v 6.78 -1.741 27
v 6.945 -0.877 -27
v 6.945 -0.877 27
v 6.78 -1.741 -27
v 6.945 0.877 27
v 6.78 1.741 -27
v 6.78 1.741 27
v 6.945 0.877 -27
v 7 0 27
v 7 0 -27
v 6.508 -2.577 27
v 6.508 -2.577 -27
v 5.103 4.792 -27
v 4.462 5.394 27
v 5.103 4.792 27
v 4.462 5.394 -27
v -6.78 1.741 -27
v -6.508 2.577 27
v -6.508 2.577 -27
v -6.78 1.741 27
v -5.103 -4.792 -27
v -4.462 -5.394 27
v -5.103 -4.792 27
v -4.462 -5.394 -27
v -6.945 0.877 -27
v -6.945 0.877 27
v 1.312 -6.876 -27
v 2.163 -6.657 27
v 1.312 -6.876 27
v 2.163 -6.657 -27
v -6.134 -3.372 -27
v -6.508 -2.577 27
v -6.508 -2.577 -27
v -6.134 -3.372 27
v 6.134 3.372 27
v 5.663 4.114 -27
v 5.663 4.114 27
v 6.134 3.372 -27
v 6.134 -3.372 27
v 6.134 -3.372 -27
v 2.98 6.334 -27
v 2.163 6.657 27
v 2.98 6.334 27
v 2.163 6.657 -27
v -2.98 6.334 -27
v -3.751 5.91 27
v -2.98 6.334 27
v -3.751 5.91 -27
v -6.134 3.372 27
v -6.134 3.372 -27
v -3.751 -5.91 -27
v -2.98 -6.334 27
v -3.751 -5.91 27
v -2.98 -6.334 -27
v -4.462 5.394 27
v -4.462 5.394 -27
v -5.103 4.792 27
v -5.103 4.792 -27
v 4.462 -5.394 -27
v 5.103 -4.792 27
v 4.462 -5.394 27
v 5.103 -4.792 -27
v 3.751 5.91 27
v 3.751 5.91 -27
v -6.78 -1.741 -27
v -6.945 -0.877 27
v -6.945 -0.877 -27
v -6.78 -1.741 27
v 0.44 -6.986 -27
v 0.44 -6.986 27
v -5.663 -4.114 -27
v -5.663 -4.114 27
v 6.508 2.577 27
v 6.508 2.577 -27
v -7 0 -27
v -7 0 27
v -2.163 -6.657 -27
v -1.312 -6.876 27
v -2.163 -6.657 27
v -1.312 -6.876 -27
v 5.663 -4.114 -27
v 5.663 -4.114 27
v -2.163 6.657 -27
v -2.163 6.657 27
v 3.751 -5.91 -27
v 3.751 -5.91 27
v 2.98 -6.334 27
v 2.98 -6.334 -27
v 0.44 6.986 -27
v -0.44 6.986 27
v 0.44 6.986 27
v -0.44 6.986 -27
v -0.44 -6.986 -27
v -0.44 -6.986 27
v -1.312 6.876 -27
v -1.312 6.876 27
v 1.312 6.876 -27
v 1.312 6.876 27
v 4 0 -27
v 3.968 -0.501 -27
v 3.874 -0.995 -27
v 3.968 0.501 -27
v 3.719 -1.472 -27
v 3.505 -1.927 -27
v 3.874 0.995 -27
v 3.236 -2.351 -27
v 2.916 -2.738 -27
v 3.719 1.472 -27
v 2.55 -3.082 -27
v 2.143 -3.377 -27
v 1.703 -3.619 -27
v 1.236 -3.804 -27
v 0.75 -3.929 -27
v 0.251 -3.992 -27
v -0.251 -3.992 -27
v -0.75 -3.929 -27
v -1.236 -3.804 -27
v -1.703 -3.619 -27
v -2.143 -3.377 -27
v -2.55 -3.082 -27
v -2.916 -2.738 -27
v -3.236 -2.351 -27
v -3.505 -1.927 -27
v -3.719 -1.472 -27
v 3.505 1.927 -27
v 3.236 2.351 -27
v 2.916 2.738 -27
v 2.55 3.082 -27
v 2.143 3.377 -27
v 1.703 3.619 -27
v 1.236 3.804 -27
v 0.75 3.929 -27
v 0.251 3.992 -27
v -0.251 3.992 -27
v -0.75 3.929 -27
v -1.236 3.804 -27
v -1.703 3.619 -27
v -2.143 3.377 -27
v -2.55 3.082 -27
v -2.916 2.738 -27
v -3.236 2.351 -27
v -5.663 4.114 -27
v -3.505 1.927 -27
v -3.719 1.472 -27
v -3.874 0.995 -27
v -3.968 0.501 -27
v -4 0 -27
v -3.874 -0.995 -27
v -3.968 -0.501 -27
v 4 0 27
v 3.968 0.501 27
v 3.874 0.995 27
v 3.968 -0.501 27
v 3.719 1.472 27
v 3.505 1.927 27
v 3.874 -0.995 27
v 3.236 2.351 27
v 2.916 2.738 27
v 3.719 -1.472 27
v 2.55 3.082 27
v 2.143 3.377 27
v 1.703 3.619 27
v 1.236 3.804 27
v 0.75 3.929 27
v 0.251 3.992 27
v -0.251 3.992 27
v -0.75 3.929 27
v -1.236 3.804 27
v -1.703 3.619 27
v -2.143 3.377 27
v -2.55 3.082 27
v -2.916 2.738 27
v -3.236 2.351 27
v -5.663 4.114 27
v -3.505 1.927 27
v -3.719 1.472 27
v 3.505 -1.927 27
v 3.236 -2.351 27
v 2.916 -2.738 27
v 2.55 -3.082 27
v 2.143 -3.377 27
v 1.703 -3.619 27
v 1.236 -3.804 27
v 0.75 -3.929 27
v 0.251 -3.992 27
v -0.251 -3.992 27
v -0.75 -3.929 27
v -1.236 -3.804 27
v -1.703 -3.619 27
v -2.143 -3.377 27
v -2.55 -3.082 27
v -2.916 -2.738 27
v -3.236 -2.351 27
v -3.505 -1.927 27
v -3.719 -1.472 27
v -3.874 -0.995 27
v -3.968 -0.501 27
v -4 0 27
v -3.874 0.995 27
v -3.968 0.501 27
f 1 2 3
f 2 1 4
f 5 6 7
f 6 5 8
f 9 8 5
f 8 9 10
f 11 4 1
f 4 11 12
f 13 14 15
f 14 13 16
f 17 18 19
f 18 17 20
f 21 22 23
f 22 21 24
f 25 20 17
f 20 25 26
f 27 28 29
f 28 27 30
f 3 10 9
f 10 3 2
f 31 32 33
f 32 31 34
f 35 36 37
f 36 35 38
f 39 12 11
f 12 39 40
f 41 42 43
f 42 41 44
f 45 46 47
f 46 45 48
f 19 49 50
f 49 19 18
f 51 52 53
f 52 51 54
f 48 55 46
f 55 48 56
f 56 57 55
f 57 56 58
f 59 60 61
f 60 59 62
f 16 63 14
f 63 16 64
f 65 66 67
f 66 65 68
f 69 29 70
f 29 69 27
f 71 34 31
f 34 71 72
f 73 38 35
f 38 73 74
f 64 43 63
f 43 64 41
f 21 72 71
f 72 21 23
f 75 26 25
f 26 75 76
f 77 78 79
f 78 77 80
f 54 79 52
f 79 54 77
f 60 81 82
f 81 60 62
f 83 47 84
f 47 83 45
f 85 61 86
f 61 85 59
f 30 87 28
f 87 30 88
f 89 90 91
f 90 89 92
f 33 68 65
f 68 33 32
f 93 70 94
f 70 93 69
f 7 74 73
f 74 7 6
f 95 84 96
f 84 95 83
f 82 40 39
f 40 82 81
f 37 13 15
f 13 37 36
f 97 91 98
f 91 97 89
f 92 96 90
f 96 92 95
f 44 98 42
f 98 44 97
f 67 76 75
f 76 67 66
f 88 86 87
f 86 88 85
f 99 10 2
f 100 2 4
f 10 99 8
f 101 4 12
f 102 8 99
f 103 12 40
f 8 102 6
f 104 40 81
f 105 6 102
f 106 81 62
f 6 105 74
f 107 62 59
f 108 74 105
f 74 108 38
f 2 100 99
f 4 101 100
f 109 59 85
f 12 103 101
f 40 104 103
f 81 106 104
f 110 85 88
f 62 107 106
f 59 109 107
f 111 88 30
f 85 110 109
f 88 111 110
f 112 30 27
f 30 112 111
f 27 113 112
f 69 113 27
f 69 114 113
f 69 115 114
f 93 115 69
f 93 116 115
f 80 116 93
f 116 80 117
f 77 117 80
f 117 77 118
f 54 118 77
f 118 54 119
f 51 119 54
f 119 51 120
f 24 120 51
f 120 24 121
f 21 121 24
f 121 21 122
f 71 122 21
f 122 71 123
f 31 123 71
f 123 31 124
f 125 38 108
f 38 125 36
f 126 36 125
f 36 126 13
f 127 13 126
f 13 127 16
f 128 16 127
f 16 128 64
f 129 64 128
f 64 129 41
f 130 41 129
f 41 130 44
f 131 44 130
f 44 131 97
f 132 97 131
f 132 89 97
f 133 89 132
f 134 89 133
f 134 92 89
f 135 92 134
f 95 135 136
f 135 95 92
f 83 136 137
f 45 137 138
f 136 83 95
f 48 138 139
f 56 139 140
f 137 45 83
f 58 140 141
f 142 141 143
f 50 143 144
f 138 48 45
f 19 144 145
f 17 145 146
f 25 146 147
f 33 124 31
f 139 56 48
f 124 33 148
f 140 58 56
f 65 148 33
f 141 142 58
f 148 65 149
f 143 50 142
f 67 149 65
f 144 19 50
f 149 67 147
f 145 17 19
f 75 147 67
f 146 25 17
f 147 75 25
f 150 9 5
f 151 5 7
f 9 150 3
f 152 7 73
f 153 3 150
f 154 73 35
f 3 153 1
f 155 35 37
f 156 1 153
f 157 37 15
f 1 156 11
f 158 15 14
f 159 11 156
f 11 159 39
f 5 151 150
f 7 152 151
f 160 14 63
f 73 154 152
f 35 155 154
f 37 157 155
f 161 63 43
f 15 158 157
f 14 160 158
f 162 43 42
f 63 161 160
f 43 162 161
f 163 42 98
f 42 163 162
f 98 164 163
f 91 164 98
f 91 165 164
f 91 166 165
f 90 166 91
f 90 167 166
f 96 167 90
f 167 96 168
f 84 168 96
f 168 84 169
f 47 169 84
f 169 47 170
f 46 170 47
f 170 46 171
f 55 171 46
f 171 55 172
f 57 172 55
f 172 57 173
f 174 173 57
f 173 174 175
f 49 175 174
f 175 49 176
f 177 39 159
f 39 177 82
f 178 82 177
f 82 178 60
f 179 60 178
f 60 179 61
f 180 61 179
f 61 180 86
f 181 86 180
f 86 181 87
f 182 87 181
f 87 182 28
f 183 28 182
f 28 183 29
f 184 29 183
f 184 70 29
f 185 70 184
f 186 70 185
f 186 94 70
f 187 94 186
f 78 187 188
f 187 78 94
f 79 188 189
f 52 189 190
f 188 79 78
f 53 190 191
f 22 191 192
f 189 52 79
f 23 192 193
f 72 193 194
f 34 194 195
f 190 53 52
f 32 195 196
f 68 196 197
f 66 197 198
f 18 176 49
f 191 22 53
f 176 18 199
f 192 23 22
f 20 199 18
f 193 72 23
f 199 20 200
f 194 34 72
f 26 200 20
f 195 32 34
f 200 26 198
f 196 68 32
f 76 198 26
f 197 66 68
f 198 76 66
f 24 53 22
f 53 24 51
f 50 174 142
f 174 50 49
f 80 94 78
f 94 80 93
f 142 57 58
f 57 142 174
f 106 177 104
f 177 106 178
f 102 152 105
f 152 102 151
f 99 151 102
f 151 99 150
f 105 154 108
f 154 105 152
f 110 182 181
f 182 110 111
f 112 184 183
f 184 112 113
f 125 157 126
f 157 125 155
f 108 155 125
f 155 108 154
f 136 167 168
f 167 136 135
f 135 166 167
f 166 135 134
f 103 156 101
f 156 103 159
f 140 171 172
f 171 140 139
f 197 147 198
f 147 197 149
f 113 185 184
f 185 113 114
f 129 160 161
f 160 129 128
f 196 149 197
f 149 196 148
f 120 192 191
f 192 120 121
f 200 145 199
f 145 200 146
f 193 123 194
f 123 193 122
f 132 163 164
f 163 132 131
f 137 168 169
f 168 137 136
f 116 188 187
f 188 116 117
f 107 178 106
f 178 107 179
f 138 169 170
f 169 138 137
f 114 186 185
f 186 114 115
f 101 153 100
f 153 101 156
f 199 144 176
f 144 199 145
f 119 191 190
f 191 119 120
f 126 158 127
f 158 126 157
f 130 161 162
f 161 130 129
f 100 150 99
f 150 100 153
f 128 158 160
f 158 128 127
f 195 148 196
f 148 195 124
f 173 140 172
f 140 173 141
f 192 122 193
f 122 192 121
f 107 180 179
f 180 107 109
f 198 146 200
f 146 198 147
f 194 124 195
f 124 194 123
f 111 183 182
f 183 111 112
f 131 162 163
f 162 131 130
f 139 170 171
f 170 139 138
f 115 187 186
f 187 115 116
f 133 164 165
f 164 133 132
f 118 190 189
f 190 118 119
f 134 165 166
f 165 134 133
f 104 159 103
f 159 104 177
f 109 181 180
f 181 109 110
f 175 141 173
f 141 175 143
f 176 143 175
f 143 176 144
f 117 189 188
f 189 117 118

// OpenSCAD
$fn = 50;


difference() {
	union() {
		translate(v = [0, 0, -27.0000000000]) {
			cylinder(h = 54, r = 7.0000000000);
		}
	}
	union() {
		translate(v = [0, 0, -100.0000000000]) {
			cylinder(h = 200, r = 4.0000000000);
		}
	}
}
